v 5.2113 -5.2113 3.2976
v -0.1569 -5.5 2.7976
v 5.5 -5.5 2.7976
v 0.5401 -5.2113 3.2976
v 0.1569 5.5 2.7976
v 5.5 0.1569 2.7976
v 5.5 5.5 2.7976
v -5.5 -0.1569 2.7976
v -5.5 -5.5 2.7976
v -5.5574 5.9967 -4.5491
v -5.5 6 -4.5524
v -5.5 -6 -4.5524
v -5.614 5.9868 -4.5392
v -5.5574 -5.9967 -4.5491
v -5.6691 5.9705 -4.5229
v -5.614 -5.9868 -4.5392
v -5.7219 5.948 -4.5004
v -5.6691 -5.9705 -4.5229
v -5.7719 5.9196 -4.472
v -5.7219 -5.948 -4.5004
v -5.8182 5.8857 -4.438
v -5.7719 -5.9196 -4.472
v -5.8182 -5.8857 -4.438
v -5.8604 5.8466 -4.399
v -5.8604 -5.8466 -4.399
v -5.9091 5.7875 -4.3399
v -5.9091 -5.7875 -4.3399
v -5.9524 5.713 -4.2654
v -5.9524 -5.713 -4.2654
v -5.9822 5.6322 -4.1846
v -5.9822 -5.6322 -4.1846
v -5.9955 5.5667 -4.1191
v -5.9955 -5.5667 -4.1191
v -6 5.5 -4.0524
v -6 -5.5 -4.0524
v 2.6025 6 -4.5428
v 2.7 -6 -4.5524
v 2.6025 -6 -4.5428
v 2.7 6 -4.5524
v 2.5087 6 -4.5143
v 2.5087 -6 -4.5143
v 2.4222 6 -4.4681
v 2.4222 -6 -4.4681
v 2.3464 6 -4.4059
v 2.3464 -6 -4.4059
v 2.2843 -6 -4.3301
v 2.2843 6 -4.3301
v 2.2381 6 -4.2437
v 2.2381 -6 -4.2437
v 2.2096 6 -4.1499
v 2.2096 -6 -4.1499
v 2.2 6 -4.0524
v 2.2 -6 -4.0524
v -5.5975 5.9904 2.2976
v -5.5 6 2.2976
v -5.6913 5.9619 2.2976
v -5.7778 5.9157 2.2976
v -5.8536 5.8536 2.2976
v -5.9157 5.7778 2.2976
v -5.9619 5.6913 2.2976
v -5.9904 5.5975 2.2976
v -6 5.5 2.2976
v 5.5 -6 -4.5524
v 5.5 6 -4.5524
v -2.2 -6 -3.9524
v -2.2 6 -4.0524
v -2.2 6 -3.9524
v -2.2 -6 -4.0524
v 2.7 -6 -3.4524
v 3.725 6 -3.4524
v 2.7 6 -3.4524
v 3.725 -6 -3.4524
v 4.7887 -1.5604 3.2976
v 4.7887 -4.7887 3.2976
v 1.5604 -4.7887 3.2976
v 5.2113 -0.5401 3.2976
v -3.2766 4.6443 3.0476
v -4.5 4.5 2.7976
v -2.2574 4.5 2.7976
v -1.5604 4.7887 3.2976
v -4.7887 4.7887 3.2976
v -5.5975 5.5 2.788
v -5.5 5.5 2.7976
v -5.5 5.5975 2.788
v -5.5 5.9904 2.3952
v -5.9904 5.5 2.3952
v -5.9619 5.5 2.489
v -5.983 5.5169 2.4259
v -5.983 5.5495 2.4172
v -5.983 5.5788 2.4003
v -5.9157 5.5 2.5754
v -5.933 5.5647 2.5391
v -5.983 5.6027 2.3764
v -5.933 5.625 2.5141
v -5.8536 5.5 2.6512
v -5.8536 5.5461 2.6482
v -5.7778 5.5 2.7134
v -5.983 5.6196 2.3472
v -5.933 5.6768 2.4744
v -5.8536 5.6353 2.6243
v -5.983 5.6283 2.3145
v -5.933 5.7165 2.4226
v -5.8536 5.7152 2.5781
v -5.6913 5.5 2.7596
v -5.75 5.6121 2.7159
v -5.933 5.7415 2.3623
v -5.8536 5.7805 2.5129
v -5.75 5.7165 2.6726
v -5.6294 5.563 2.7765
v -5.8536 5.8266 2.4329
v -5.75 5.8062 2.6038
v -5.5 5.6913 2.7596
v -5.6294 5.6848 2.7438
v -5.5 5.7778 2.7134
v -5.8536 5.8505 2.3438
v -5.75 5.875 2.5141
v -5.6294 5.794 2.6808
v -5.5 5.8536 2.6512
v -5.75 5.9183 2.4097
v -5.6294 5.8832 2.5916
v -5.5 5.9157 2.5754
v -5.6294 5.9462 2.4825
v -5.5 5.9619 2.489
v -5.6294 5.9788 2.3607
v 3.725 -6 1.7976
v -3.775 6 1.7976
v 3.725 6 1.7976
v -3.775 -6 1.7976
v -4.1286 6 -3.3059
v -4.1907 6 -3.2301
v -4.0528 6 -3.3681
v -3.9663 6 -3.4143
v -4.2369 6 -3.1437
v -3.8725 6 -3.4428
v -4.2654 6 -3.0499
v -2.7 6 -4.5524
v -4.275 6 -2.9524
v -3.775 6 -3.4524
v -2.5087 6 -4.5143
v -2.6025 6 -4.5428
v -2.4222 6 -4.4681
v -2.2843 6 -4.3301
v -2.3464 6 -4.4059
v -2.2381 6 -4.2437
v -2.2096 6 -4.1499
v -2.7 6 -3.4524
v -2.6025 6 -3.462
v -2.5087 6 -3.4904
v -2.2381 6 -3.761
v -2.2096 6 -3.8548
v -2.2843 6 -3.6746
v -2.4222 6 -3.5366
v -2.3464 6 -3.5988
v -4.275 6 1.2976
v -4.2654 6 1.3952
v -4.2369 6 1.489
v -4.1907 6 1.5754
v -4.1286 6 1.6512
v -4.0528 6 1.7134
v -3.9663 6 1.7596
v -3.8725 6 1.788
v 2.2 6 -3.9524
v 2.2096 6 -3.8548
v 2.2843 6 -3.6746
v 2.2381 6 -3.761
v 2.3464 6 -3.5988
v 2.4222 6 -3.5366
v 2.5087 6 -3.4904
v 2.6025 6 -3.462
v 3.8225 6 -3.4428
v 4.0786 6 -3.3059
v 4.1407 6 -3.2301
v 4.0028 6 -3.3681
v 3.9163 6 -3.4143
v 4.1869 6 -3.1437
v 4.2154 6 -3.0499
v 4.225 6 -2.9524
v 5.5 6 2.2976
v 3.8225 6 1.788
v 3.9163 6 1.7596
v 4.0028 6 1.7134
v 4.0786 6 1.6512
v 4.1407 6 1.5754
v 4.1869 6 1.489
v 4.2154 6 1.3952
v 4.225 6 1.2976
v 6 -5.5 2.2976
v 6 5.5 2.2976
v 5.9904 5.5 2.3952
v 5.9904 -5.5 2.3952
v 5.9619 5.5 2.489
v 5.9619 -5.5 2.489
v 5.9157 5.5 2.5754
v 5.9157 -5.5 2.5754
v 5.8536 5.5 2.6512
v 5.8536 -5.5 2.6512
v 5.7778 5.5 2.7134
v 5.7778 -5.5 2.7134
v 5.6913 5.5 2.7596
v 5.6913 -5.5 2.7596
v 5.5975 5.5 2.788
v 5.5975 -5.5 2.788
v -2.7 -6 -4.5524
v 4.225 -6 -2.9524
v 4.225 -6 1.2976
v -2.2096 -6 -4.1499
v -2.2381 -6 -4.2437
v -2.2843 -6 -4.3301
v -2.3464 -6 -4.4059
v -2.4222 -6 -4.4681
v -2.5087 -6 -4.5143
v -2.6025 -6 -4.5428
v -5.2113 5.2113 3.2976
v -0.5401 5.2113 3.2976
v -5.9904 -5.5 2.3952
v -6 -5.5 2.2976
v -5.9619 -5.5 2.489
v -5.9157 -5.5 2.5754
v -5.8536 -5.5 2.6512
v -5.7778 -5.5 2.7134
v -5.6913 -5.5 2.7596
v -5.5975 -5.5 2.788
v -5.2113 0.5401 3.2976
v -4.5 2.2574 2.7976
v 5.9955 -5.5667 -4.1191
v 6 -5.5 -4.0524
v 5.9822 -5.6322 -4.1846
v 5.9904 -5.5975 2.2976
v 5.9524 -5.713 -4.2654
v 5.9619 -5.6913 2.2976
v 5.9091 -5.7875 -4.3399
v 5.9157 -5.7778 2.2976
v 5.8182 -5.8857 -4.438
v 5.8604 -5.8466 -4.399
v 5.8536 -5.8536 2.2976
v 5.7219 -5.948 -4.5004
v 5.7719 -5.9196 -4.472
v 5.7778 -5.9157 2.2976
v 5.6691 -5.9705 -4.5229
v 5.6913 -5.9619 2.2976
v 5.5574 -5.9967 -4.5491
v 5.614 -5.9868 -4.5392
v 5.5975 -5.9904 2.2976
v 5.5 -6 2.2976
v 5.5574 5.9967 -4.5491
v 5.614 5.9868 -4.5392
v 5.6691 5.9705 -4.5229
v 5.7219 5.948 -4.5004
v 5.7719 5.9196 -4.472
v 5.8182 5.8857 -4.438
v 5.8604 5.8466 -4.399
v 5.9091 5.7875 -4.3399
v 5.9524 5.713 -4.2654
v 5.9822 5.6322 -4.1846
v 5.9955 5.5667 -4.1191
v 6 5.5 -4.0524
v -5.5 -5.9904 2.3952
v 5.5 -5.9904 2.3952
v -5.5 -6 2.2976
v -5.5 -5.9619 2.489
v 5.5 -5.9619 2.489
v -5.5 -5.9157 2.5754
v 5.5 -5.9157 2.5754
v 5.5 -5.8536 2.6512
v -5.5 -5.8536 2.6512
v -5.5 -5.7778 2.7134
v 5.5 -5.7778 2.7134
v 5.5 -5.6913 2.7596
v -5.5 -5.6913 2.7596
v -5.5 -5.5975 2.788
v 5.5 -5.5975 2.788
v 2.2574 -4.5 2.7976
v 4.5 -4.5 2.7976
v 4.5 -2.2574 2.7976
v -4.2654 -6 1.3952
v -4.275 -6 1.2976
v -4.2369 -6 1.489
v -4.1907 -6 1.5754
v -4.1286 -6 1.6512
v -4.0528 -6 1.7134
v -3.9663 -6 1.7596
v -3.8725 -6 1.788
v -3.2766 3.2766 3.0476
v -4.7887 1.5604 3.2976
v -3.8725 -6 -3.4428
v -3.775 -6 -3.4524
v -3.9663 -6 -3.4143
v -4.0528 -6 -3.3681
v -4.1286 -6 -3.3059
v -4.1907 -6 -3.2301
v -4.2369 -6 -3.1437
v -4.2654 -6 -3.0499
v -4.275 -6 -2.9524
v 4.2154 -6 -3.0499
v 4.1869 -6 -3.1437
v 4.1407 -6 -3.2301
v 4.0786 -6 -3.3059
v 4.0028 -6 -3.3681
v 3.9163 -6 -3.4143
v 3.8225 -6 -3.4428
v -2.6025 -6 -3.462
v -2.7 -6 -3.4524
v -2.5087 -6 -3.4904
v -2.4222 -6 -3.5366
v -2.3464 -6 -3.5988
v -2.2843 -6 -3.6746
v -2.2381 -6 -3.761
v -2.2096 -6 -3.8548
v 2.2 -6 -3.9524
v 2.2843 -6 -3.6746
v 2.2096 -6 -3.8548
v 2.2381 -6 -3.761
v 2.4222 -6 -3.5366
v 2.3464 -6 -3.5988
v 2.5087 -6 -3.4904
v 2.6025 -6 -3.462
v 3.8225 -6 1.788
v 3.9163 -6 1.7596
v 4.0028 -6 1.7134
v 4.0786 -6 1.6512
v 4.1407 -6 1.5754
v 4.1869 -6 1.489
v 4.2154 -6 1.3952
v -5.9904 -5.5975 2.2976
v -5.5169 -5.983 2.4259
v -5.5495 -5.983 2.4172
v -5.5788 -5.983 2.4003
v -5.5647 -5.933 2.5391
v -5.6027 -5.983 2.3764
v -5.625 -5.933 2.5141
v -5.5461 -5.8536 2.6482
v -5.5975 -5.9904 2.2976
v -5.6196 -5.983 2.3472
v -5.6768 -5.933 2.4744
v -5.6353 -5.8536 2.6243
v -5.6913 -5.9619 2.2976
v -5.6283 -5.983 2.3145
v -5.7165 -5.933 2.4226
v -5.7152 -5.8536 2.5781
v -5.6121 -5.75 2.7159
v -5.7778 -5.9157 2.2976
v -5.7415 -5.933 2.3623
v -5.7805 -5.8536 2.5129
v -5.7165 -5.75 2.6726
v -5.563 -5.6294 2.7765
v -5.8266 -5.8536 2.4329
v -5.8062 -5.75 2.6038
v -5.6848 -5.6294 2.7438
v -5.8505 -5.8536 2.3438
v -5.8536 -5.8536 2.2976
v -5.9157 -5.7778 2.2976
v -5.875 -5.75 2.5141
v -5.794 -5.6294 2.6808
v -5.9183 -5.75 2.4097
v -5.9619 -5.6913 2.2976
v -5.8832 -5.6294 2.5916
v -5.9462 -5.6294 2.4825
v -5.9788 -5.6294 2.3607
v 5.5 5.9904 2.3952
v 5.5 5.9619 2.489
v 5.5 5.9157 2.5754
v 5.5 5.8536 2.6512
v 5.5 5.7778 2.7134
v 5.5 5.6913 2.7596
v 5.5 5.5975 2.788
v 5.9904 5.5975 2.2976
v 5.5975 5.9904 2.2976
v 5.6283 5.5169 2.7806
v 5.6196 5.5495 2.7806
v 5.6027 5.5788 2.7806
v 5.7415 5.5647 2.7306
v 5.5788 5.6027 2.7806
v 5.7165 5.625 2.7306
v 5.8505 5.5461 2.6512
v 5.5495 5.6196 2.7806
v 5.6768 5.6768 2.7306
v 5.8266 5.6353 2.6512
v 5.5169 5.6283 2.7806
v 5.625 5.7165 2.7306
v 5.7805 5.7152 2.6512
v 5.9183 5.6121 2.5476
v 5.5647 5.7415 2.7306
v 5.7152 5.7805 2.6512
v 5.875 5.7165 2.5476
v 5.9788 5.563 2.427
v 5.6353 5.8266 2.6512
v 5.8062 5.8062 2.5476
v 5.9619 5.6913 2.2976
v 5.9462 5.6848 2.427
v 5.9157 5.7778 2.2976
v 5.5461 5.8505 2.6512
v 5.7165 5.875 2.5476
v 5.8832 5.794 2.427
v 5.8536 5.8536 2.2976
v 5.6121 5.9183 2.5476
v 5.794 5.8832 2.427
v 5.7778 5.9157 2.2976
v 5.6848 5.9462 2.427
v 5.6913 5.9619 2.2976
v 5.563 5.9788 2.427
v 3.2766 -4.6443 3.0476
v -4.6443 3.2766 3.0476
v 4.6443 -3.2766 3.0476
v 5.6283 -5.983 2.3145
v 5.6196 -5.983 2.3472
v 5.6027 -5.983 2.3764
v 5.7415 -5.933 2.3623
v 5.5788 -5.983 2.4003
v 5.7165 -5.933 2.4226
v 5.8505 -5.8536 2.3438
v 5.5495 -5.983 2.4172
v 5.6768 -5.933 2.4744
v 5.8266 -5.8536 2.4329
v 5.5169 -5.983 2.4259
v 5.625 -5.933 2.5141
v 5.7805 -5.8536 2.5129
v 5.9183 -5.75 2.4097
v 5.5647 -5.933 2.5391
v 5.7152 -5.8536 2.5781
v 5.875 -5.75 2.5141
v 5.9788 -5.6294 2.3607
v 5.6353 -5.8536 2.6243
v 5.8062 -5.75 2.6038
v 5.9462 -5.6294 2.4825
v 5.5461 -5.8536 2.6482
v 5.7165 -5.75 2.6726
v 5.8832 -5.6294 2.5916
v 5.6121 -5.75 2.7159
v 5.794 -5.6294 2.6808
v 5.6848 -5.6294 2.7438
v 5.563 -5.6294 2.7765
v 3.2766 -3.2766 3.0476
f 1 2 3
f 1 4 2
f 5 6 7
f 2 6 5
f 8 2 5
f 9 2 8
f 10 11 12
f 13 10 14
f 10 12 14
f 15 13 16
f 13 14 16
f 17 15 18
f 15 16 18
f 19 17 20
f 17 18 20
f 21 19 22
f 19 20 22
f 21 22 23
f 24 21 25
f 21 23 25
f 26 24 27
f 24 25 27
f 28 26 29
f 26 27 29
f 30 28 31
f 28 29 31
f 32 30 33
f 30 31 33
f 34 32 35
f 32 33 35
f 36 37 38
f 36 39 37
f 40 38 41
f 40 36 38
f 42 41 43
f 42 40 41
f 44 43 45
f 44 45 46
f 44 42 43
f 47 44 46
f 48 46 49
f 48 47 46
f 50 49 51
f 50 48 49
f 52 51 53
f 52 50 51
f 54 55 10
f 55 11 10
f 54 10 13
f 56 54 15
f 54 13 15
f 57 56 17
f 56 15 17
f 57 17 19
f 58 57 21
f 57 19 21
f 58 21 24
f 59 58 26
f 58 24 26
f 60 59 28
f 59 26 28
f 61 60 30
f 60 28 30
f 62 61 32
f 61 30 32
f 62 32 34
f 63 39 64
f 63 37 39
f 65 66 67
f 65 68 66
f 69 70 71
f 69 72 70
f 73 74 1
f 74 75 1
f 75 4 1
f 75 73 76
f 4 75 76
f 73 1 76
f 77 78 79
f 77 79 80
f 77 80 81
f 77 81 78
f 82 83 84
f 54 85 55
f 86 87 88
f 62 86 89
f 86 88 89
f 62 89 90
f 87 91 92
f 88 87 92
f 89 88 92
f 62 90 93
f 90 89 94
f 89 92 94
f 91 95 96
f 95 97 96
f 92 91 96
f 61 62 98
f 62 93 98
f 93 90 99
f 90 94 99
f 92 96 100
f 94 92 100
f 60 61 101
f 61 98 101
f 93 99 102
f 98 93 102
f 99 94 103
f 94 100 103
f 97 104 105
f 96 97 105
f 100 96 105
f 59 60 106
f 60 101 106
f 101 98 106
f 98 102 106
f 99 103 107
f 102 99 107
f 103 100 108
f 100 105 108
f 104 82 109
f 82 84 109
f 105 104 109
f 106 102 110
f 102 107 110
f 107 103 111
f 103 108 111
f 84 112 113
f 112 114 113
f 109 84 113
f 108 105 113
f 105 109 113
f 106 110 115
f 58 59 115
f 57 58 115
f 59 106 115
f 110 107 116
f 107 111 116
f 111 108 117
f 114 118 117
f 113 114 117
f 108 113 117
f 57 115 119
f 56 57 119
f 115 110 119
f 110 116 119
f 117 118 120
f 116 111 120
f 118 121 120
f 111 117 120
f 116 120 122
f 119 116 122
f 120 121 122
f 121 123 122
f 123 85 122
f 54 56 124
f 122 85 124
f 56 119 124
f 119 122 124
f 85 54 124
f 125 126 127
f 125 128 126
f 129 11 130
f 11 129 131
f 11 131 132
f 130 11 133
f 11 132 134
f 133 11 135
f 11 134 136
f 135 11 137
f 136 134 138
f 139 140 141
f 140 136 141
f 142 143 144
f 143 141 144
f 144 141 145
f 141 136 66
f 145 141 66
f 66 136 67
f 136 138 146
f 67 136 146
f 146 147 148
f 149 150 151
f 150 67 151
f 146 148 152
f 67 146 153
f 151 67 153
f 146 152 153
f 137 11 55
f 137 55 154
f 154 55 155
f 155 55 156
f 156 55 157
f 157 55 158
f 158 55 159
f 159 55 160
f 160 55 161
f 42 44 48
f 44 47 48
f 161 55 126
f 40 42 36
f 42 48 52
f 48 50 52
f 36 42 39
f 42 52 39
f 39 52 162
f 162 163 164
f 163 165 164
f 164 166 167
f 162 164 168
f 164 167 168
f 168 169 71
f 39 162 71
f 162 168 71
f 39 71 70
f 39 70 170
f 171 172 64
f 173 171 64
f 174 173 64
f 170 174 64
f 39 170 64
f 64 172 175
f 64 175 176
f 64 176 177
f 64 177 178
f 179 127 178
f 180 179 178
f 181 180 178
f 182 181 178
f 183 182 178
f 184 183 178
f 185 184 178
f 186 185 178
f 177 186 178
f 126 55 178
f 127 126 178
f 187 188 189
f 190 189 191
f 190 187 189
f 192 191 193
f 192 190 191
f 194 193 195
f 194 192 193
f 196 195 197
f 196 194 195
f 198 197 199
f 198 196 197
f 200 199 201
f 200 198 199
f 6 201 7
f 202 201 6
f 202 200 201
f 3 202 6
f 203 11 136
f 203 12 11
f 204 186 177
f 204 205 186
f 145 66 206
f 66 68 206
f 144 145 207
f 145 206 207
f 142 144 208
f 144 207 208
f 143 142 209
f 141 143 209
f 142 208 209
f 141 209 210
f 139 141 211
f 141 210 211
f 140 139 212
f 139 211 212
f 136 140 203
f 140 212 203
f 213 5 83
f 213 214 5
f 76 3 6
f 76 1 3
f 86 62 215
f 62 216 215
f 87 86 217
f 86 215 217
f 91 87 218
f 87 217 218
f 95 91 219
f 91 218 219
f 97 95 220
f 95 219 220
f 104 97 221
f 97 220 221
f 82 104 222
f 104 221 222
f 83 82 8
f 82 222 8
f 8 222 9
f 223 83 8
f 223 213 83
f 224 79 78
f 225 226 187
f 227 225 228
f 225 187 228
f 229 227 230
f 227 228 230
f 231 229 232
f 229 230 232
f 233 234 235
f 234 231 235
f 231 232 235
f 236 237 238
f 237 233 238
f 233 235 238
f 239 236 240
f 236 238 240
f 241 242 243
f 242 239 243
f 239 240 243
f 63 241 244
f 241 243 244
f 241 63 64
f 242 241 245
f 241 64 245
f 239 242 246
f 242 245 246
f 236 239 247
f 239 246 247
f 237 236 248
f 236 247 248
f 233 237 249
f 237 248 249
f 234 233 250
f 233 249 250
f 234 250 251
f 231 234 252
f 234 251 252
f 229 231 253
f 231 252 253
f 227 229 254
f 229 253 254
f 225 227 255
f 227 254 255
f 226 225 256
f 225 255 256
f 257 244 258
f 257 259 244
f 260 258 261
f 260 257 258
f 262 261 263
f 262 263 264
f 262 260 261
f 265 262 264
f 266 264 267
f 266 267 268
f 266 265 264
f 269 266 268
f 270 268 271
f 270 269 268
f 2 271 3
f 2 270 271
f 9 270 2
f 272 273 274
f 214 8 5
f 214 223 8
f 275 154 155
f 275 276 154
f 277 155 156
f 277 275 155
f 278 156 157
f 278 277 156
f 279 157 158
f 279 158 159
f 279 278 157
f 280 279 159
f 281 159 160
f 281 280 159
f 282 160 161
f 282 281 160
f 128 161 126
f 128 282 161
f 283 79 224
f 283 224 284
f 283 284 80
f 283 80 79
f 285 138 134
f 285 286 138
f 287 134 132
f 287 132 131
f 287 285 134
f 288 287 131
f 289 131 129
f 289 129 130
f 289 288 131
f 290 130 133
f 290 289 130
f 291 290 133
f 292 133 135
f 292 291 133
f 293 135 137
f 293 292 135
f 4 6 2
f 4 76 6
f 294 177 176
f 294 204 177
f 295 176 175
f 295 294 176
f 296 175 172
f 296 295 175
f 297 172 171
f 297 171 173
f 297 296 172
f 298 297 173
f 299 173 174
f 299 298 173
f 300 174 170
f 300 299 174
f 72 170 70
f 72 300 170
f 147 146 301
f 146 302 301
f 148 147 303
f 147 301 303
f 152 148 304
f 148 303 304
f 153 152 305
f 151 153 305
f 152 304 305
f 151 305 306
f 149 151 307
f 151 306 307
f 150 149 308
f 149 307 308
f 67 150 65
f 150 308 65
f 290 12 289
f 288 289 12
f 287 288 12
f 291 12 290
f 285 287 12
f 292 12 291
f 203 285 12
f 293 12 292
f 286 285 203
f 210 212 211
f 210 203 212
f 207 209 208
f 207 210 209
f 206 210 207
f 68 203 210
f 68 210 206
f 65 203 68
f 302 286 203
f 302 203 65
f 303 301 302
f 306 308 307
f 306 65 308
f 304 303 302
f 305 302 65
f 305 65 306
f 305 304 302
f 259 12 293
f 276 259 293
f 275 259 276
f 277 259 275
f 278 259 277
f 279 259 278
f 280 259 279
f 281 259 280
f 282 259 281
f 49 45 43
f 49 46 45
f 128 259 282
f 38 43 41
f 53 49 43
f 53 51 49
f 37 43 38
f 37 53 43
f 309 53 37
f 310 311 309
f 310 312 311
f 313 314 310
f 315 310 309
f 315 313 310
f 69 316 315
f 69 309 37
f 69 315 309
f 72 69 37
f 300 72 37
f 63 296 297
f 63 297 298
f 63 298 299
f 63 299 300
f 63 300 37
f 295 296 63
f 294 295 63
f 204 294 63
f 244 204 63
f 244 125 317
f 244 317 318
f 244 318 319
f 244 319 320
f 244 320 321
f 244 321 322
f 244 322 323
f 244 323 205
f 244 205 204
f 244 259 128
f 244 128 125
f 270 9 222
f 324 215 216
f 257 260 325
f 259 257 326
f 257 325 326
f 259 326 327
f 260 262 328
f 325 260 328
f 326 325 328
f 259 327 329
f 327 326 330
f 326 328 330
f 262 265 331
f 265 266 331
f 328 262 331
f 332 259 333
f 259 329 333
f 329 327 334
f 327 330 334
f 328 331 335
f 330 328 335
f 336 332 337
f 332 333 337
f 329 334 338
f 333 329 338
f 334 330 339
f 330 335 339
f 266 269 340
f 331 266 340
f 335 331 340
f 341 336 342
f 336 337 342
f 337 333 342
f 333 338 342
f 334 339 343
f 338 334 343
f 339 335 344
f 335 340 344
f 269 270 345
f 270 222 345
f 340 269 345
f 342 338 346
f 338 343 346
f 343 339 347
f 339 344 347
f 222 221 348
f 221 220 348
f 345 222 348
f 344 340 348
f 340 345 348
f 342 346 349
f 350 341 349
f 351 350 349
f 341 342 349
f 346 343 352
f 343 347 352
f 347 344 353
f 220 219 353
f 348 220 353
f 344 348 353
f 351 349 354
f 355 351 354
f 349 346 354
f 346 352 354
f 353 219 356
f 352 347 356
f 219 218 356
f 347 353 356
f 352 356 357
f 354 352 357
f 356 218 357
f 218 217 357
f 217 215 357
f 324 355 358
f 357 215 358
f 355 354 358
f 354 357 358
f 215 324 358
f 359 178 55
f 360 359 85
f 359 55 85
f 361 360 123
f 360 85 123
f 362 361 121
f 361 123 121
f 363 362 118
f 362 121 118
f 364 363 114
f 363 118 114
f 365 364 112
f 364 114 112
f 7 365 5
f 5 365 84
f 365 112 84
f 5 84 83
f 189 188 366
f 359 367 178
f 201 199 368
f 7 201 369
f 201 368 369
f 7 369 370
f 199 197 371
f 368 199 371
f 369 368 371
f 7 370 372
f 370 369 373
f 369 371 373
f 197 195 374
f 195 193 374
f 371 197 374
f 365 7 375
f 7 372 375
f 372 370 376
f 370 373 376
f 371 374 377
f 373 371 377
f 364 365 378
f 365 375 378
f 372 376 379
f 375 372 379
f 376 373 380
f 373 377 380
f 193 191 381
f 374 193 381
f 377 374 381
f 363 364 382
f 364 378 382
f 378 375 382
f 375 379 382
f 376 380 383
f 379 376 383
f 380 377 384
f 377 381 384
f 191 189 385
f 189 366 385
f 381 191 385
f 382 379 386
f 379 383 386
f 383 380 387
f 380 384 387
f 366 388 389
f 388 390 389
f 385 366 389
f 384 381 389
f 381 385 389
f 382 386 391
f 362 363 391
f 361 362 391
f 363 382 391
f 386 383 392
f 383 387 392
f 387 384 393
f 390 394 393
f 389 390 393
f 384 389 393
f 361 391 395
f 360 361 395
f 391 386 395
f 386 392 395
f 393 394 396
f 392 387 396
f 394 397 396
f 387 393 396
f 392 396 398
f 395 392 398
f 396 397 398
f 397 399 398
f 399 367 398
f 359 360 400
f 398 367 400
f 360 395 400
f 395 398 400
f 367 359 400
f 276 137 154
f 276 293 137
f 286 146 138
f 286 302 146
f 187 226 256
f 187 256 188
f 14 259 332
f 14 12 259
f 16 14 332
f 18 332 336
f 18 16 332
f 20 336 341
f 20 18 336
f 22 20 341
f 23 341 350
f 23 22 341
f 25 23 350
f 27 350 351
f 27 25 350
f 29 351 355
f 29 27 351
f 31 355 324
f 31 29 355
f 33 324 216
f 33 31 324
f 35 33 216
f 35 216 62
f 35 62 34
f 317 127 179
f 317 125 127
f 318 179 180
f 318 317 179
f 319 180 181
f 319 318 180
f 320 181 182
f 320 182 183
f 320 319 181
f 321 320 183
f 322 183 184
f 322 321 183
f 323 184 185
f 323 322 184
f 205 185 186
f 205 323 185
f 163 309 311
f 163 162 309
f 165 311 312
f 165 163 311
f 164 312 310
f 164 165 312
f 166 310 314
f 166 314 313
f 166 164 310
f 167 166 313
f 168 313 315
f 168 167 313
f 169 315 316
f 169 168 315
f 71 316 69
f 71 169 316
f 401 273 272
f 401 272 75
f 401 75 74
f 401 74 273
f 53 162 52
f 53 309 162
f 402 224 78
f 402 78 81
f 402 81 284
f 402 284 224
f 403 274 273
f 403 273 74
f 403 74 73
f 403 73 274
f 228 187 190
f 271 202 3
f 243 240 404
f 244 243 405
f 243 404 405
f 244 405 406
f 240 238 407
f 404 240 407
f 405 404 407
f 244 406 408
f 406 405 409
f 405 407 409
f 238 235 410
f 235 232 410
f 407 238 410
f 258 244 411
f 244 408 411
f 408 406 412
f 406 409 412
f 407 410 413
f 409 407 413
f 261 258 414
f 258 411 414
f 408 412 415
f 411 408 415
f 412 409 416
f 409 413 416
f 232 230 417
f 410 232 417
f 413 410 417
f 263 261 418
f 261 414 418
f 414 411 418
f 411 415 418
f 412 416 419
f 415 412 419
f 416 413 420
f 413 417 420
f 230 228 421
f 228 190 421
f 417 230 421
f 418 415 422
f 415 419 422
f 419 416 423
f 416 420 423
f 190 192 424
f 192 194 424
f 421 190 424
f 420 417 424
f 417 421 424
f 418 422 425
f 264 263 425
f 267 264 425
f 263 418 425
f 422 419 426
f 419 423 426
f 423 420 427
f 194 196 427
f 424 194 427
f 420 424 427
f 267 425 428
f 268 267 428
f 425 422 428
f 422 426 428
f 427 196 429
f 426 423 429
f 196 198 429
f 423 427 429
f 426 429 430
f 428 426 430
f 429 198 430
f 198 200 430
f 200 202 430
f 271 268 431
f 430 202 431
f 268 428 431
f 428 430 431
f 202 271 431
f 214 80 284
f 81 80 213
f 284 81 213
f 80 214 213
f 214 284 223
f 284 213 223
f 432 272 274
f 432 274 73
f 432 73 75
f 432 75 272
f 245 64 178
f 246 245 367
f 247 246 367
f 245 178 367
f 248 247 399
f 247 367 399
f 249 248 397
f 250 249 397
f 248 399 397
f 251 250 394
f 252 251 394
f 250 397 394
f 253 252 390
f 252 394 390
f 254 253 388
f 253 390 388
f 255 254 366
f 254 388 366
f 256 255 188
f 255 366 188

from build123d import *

# Parameters (mm, degrees)
F1_DEPTH = 6
F2_R     = 0.5
F3_R     = 0.5
F5_DEPTH = 0.5
F5_TAPER = 30
F6_R     = 0.5


with BuildPart() as f1:
    # F0 (on Front) → F1 (new body, symmetric)
    with BuildSketch(Plane.XZ):
        Polygon((6, -4.5523648744), (6, 2.7976351256), (-6, 2.7976351256), (-6, -4.5523648744), (-2.2, -4.5523648744), (-2.2, -3.4523648744), (-4.275, -3.4523648744), (-4.275, 1.7976351256), (4.225, 1.7976351256), (4.225, -3.4523648744), (2.2, -3.4523648744), (2.2, -4.5523648744), align=None)
    extrude(amount=F1_DEPTH, both=True)

    # F2
    f2_edges = [f1.edges().sort_by_distance(p)[0] for p in [
        (-2.2, 0, -4.552365),
        (2.2, 0, -4.552365),
        (-2.2, 0, -3.452365),
        (2.2, 0, -3.452365),
    ]]
    fillet(f2_edges, radius=F2_R)

    # F3
    f3_edges = [f1.edges().sort_by_distance(p)[0] for p in [
        (6, 0, -4.552365),
        (6, 6, -0.877365),
        (6, 0, 2.797635),
        (6, -6, -0.877365),
        (0, 6, 2.797635),
        (-6, 0, 2.797635),
        (0, -6, 2.797635),
        (-6, 6, -0.877365),
        (-6, 0, -4.552365),
        (-6, -6, -0.877365),
    ]]
    fillet(f3_edges, radius=F3_R)

    # F4 (on face) → F5 (join)
    with BuildSketch(Plane.XY.offset(2.7976351256)):
        Polygon((-0.8431457505, 4.5), (0.1568542495, 5.5), (-1.2573593129, 5.5), (-2.2573593129, 4.5), align=None)
        Polygon((-4.5, 0.8431457505), (-0.8431457505, 4.5), (-2.2573593129, 4.5), (-4.5, 2.2573593129), align=None)
        Polygon((-5.5, 1.2573593129), (-5.5, -0.1568542495), (-4.5, 0.8431457505), (-4.5, 2.2573593129), align=None)
        Polygon((-0.1568542495, -5.5), (5.5, -5.5), (5.5, 0.1568542495), (4.5, -0.8431457505), (4.5, -2.2573593129), (4.5, -4.5), (2.2573593129, -4.5), (0.8431457505, -4.5), align=None)
        Polygon((-2.2573593129, 4.5), (-1.2573593129, 5.5), (-5.5, 5.5), (-5.5, 1.2573593129), (-4.5, 2.2573593129), (-4.5, 4.5), align=None)
        Polygon((4.5, -2.2573593129), (4.5, -0.8431457505), (0.8431457505, -4.5), (2.2573593129, -4.5), align=None)
    extrude(amount=F5_DEPTH, taper=F5_TAPER)

    # F6
    f6_edges = [f1.edges().sort_by_distance(p)[0] for p in [
        (-4.275, 0, 1.797635),
        (4.225, 0, 1.797635),
        (-4.275, 0, -3.452365),
        (4.225, 0, -3.452365),
    ]]
    fillet(f6_edges, radius=F6_R)


solid = f1.part
